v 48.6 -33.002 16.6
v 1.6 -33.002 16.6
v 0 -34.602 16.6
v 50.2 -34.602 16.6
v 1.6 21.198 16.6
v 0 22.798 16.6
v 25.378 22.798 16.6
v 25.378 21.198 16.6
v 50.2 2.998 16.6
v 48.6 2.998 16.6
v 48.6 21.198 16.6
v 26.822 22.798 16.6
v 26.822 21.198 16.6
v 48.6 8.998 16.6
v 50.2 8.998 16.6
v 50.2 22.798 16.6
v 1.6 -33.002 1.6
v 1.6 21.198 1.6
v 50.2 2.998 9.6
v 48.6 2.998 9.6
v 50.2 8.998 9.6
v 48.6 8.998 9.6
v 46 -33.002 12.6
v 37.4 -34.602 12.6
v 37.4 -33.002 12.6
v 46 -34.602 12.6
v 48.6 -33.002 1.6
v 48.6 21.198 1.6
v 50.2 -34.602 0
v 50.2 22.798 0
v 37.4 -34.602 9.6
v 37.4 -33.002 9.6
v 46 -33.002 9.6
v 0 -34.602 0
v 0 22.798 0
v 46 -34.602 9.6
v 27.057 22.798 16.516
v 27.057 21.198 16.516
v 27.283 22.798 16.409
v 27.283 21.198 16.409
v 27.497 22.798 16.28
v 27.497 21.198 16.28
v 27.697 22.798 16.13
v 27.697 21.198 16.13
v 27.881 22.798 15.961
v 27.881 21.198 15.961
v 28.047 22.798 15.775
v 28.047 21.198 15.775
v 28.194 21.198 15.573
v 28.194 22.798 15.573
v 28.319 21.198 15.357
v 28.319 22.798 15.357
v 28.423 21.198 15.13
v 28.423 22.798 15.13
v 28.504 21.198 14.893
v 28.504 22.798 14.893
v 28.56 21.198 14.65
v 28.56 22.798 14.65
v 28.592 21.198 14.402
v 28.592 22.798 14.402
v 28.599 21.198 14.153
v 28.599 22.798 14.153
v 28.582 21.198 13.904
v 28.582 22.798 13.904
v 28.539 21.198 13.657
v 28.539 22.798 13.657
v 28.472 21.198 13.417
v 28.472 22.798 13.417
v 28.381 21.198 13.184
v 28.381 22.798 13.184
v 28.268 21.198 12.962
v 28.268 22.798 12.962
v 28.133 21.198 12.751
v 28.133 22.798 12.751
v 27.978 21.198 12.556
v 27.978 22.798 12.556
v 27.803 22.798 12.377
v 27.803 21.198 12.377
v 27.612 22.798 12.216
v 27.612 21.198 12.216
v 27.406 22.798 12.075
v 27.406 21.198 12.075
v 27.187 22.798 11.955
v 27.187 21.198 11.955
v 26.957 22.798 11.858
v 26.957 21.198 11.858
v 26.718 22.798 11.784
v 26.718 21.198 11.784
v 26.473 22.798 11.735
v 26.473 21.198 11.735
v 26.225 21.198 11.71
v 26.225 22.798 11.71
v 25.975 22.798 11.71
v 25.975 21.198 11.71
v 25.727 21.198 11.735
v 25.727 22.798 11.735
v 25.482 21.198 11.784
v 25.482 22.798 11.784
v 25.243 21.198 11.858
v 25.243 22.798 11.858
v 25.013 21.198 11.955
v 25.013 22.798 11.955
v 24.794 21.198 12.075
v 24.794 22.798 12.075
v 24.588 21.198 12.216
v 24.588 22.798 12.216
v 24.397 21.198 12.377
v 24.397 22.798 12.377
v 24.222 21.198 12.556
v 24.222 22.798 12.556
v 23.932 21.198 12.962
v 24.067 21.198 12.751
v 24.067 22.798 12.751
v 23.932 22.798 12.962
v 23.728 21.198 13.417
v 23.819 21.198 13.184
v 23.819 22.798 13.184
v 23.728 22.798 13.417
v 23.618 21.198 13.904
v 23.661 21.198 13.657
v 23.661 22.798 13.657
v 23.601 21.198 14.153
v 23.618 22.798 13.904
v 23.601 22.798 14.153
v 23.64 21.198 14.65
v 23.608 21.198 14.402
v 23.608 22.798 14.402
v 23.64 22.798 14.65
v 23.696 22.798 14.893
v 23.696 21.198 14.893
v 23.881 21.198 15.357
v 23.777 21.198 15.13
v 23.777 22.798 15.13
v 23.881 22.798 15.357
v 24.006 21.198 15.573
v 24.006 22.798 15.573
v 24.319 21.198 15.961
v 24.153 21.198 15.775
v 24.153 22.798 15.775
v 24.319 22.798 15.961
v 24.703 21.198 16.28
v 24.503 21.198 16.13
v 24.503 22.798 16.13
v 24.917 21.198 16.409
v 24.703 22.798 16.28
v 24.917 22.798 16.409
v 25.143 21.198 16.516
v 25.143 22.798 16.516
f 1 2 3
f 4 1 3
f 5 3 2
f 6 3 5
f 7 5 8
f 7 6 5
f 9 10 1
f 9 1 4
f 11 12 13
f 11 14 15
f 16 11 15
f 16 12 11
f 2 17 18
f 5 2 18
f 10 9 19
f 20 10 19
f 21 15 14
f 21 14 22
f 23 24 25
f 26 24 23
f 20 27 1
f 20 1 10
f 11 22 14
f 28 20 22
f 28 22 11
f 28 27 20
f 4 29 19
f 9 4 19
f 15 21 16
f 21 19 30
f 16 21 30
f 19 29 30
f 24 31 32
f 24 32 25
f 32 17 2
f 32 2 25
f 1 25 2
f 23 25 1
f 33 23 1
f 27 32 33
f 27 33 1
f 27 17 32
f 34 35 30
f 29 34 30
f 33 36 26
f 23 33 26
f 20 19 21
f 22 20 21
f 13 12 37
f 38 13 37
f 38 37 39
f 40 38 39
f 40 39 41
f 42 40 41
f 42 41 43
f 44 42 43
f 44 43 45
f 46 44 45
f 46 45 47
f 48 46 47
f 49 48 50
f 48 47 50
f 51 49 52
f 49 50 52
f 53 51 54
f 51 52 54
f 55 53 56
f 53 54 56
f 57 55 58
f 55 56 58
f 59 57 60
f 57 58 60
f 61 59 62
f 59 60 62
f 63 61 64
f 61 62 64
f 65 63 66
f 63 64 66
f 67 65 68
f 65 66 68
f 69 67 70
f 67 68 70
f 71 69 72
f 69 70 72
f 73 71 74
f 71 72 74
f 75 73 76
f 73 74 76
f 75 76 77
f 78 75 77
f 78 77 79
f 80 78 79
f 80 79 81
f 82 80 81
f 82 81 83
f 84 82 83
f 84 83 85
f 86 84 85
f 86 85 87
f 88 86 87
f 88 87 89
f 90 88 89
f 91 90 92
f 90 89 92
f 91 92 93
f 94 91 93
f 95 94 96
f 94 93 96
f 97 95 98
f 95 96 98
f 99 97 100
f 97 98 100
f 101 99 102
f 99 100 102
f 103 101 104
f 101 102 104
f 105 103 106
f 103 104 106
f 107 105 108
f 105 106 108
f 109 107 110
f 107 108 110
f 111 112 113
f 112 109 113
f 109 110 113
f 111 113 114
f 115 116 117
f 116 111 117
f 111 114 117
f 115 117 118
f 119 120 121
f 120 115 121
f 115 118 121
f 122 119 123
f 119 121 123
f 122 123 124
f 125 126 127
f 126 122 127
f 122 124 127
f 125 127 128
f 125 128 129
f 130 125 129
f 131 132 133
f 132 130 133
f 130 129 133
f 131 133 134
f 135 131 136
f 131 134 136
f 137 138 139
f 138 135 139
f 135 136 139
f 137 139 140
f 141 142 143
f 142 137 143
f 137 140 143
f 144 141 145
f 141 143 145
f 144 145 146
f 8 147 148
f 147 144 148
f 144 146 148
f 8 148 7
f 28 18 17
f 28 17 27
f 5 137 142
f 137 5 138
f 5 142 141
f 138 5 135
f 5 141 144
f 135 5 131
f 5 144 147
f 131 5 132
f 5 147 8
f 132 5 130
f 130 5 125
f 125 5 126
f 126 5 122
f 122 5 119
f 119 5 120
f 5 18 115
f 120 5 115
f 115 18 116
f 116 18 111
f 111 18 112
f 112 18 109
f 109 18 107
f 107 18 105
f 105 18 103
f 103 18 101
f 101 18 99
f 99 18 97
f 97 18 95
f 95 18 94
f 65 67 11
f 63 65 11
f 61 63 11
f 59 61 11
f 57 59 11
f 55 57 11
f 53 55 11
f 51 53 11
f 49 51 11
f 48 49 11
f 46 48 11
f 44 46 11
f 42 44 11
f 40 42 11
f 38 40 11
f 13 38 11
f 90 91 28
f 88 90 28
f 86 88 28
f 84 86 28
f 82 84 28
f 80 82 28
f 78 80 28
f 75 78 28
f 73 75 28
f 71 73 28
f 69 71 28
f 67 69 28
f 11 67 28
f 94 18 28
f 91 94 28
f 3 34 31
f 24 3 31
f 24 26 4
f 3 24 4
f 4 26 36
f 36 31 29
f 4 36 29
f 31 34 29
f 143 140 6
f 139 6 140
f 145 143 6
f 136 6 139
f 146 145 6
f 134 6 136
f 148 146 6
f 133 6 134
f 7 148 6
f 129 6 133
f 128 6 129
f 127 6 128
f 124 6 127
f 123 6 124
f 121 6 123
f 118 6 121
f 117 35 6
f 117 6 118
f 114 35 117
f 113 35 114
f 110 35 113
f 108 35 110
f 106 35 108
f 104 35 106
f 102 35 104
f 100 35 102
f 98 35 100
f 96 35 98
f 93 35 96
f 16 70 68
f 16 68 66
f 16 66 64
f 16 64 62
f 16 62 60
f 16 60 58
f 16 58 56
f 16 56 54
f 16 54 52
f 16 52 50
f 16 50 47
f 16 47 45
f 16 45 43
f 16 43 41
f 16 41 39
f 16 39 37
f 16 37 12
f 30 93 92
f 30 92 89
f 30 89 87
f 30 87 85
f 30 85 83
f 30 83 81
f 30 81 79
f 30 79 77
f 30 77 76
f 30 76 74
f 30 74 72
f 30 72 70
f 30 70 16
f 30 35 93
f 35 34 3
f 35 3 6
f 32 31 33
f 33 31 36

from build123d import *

# Parameters (mm, degrees)
SKETCH1_W           = 50.2
SKETCH1_H           = 57.4
BOSS_EXTRUDE1_DEPTH = 16.6
SHELL1_T            = -1.6
SKETCH2_W           = 8.6
SKETCH2_H           = 3
CUT_EXTRUDE1_DEPTH  = 16.6
SKETCH3_W           = 9.2
SKETCH3_H           = 6
CUT_EXTRUDE2_DEPTH  = 16.6
SKETCH4_R           = 2.5
CUT_EXTRUDE3_DEPTH  = 16.6


with BuildPart() as part:
    # Sketch1 → Boss-Extrude1 (new body)
    with BuildSketch(Plane.XY):
        with Locations((25.1, -5.901746725)):
            Rectangle(SKETCH1_W, SKETCH1_H)
    extrude(amount=BOSS_EXTRUDE1_DEPTH)

    # Shell1
    shell1_openings = [part.faces().sort_by_distance(p)[0] for p in [
        (25.1, -5.901746725, 16.6),
    ]]
    offset(amount=SHELL1_T, openings=shell1_openings, kind=Kind.INTERSECTION)

    # Sketch2 → Cut-Extrude1 (cut)
    with BuildSketch(Plane.XZ.offset(34.601746725)):
        with Locations((41.7, 11.1)):
            Rectangle(SKETCH2_W, SKETCH2_H)
    extrude(amount=-CUT_EXTRUDE1_DEPTH, mode=Mode.SUBTRACT)

    # Sketch3 → Cut-Extrude2 (cut)
    with BuildSketch(Plane(origin=(50.2, 0, 0), x_dir=(0, 0, -1), z_dir=(1, 0, 0))):
        with Locations((-14.2, 5.998253275)):
            Rectangle(SKETCH3_W, SKETCH3_H)
    extrude(amount=-CUT_EXTRUDE2_DEPTH, mode=Mode.SUBTRACT)

    # Sketch4 → Cut-Extrude3 (cut)
    with BuildSketch(Plane(origin=(0, 22.798253275, 0), x_dir=(1, 0, 0), z_dir=(0, 1, 0))):
        with Locations((26.1, -14.206462085)):
            Circle(SKETCH4_R)
    extrude(amount=-CUT_EXTRUDE3_DEPTH, mode=Mode.SUBTRACT)


solid = part.part
